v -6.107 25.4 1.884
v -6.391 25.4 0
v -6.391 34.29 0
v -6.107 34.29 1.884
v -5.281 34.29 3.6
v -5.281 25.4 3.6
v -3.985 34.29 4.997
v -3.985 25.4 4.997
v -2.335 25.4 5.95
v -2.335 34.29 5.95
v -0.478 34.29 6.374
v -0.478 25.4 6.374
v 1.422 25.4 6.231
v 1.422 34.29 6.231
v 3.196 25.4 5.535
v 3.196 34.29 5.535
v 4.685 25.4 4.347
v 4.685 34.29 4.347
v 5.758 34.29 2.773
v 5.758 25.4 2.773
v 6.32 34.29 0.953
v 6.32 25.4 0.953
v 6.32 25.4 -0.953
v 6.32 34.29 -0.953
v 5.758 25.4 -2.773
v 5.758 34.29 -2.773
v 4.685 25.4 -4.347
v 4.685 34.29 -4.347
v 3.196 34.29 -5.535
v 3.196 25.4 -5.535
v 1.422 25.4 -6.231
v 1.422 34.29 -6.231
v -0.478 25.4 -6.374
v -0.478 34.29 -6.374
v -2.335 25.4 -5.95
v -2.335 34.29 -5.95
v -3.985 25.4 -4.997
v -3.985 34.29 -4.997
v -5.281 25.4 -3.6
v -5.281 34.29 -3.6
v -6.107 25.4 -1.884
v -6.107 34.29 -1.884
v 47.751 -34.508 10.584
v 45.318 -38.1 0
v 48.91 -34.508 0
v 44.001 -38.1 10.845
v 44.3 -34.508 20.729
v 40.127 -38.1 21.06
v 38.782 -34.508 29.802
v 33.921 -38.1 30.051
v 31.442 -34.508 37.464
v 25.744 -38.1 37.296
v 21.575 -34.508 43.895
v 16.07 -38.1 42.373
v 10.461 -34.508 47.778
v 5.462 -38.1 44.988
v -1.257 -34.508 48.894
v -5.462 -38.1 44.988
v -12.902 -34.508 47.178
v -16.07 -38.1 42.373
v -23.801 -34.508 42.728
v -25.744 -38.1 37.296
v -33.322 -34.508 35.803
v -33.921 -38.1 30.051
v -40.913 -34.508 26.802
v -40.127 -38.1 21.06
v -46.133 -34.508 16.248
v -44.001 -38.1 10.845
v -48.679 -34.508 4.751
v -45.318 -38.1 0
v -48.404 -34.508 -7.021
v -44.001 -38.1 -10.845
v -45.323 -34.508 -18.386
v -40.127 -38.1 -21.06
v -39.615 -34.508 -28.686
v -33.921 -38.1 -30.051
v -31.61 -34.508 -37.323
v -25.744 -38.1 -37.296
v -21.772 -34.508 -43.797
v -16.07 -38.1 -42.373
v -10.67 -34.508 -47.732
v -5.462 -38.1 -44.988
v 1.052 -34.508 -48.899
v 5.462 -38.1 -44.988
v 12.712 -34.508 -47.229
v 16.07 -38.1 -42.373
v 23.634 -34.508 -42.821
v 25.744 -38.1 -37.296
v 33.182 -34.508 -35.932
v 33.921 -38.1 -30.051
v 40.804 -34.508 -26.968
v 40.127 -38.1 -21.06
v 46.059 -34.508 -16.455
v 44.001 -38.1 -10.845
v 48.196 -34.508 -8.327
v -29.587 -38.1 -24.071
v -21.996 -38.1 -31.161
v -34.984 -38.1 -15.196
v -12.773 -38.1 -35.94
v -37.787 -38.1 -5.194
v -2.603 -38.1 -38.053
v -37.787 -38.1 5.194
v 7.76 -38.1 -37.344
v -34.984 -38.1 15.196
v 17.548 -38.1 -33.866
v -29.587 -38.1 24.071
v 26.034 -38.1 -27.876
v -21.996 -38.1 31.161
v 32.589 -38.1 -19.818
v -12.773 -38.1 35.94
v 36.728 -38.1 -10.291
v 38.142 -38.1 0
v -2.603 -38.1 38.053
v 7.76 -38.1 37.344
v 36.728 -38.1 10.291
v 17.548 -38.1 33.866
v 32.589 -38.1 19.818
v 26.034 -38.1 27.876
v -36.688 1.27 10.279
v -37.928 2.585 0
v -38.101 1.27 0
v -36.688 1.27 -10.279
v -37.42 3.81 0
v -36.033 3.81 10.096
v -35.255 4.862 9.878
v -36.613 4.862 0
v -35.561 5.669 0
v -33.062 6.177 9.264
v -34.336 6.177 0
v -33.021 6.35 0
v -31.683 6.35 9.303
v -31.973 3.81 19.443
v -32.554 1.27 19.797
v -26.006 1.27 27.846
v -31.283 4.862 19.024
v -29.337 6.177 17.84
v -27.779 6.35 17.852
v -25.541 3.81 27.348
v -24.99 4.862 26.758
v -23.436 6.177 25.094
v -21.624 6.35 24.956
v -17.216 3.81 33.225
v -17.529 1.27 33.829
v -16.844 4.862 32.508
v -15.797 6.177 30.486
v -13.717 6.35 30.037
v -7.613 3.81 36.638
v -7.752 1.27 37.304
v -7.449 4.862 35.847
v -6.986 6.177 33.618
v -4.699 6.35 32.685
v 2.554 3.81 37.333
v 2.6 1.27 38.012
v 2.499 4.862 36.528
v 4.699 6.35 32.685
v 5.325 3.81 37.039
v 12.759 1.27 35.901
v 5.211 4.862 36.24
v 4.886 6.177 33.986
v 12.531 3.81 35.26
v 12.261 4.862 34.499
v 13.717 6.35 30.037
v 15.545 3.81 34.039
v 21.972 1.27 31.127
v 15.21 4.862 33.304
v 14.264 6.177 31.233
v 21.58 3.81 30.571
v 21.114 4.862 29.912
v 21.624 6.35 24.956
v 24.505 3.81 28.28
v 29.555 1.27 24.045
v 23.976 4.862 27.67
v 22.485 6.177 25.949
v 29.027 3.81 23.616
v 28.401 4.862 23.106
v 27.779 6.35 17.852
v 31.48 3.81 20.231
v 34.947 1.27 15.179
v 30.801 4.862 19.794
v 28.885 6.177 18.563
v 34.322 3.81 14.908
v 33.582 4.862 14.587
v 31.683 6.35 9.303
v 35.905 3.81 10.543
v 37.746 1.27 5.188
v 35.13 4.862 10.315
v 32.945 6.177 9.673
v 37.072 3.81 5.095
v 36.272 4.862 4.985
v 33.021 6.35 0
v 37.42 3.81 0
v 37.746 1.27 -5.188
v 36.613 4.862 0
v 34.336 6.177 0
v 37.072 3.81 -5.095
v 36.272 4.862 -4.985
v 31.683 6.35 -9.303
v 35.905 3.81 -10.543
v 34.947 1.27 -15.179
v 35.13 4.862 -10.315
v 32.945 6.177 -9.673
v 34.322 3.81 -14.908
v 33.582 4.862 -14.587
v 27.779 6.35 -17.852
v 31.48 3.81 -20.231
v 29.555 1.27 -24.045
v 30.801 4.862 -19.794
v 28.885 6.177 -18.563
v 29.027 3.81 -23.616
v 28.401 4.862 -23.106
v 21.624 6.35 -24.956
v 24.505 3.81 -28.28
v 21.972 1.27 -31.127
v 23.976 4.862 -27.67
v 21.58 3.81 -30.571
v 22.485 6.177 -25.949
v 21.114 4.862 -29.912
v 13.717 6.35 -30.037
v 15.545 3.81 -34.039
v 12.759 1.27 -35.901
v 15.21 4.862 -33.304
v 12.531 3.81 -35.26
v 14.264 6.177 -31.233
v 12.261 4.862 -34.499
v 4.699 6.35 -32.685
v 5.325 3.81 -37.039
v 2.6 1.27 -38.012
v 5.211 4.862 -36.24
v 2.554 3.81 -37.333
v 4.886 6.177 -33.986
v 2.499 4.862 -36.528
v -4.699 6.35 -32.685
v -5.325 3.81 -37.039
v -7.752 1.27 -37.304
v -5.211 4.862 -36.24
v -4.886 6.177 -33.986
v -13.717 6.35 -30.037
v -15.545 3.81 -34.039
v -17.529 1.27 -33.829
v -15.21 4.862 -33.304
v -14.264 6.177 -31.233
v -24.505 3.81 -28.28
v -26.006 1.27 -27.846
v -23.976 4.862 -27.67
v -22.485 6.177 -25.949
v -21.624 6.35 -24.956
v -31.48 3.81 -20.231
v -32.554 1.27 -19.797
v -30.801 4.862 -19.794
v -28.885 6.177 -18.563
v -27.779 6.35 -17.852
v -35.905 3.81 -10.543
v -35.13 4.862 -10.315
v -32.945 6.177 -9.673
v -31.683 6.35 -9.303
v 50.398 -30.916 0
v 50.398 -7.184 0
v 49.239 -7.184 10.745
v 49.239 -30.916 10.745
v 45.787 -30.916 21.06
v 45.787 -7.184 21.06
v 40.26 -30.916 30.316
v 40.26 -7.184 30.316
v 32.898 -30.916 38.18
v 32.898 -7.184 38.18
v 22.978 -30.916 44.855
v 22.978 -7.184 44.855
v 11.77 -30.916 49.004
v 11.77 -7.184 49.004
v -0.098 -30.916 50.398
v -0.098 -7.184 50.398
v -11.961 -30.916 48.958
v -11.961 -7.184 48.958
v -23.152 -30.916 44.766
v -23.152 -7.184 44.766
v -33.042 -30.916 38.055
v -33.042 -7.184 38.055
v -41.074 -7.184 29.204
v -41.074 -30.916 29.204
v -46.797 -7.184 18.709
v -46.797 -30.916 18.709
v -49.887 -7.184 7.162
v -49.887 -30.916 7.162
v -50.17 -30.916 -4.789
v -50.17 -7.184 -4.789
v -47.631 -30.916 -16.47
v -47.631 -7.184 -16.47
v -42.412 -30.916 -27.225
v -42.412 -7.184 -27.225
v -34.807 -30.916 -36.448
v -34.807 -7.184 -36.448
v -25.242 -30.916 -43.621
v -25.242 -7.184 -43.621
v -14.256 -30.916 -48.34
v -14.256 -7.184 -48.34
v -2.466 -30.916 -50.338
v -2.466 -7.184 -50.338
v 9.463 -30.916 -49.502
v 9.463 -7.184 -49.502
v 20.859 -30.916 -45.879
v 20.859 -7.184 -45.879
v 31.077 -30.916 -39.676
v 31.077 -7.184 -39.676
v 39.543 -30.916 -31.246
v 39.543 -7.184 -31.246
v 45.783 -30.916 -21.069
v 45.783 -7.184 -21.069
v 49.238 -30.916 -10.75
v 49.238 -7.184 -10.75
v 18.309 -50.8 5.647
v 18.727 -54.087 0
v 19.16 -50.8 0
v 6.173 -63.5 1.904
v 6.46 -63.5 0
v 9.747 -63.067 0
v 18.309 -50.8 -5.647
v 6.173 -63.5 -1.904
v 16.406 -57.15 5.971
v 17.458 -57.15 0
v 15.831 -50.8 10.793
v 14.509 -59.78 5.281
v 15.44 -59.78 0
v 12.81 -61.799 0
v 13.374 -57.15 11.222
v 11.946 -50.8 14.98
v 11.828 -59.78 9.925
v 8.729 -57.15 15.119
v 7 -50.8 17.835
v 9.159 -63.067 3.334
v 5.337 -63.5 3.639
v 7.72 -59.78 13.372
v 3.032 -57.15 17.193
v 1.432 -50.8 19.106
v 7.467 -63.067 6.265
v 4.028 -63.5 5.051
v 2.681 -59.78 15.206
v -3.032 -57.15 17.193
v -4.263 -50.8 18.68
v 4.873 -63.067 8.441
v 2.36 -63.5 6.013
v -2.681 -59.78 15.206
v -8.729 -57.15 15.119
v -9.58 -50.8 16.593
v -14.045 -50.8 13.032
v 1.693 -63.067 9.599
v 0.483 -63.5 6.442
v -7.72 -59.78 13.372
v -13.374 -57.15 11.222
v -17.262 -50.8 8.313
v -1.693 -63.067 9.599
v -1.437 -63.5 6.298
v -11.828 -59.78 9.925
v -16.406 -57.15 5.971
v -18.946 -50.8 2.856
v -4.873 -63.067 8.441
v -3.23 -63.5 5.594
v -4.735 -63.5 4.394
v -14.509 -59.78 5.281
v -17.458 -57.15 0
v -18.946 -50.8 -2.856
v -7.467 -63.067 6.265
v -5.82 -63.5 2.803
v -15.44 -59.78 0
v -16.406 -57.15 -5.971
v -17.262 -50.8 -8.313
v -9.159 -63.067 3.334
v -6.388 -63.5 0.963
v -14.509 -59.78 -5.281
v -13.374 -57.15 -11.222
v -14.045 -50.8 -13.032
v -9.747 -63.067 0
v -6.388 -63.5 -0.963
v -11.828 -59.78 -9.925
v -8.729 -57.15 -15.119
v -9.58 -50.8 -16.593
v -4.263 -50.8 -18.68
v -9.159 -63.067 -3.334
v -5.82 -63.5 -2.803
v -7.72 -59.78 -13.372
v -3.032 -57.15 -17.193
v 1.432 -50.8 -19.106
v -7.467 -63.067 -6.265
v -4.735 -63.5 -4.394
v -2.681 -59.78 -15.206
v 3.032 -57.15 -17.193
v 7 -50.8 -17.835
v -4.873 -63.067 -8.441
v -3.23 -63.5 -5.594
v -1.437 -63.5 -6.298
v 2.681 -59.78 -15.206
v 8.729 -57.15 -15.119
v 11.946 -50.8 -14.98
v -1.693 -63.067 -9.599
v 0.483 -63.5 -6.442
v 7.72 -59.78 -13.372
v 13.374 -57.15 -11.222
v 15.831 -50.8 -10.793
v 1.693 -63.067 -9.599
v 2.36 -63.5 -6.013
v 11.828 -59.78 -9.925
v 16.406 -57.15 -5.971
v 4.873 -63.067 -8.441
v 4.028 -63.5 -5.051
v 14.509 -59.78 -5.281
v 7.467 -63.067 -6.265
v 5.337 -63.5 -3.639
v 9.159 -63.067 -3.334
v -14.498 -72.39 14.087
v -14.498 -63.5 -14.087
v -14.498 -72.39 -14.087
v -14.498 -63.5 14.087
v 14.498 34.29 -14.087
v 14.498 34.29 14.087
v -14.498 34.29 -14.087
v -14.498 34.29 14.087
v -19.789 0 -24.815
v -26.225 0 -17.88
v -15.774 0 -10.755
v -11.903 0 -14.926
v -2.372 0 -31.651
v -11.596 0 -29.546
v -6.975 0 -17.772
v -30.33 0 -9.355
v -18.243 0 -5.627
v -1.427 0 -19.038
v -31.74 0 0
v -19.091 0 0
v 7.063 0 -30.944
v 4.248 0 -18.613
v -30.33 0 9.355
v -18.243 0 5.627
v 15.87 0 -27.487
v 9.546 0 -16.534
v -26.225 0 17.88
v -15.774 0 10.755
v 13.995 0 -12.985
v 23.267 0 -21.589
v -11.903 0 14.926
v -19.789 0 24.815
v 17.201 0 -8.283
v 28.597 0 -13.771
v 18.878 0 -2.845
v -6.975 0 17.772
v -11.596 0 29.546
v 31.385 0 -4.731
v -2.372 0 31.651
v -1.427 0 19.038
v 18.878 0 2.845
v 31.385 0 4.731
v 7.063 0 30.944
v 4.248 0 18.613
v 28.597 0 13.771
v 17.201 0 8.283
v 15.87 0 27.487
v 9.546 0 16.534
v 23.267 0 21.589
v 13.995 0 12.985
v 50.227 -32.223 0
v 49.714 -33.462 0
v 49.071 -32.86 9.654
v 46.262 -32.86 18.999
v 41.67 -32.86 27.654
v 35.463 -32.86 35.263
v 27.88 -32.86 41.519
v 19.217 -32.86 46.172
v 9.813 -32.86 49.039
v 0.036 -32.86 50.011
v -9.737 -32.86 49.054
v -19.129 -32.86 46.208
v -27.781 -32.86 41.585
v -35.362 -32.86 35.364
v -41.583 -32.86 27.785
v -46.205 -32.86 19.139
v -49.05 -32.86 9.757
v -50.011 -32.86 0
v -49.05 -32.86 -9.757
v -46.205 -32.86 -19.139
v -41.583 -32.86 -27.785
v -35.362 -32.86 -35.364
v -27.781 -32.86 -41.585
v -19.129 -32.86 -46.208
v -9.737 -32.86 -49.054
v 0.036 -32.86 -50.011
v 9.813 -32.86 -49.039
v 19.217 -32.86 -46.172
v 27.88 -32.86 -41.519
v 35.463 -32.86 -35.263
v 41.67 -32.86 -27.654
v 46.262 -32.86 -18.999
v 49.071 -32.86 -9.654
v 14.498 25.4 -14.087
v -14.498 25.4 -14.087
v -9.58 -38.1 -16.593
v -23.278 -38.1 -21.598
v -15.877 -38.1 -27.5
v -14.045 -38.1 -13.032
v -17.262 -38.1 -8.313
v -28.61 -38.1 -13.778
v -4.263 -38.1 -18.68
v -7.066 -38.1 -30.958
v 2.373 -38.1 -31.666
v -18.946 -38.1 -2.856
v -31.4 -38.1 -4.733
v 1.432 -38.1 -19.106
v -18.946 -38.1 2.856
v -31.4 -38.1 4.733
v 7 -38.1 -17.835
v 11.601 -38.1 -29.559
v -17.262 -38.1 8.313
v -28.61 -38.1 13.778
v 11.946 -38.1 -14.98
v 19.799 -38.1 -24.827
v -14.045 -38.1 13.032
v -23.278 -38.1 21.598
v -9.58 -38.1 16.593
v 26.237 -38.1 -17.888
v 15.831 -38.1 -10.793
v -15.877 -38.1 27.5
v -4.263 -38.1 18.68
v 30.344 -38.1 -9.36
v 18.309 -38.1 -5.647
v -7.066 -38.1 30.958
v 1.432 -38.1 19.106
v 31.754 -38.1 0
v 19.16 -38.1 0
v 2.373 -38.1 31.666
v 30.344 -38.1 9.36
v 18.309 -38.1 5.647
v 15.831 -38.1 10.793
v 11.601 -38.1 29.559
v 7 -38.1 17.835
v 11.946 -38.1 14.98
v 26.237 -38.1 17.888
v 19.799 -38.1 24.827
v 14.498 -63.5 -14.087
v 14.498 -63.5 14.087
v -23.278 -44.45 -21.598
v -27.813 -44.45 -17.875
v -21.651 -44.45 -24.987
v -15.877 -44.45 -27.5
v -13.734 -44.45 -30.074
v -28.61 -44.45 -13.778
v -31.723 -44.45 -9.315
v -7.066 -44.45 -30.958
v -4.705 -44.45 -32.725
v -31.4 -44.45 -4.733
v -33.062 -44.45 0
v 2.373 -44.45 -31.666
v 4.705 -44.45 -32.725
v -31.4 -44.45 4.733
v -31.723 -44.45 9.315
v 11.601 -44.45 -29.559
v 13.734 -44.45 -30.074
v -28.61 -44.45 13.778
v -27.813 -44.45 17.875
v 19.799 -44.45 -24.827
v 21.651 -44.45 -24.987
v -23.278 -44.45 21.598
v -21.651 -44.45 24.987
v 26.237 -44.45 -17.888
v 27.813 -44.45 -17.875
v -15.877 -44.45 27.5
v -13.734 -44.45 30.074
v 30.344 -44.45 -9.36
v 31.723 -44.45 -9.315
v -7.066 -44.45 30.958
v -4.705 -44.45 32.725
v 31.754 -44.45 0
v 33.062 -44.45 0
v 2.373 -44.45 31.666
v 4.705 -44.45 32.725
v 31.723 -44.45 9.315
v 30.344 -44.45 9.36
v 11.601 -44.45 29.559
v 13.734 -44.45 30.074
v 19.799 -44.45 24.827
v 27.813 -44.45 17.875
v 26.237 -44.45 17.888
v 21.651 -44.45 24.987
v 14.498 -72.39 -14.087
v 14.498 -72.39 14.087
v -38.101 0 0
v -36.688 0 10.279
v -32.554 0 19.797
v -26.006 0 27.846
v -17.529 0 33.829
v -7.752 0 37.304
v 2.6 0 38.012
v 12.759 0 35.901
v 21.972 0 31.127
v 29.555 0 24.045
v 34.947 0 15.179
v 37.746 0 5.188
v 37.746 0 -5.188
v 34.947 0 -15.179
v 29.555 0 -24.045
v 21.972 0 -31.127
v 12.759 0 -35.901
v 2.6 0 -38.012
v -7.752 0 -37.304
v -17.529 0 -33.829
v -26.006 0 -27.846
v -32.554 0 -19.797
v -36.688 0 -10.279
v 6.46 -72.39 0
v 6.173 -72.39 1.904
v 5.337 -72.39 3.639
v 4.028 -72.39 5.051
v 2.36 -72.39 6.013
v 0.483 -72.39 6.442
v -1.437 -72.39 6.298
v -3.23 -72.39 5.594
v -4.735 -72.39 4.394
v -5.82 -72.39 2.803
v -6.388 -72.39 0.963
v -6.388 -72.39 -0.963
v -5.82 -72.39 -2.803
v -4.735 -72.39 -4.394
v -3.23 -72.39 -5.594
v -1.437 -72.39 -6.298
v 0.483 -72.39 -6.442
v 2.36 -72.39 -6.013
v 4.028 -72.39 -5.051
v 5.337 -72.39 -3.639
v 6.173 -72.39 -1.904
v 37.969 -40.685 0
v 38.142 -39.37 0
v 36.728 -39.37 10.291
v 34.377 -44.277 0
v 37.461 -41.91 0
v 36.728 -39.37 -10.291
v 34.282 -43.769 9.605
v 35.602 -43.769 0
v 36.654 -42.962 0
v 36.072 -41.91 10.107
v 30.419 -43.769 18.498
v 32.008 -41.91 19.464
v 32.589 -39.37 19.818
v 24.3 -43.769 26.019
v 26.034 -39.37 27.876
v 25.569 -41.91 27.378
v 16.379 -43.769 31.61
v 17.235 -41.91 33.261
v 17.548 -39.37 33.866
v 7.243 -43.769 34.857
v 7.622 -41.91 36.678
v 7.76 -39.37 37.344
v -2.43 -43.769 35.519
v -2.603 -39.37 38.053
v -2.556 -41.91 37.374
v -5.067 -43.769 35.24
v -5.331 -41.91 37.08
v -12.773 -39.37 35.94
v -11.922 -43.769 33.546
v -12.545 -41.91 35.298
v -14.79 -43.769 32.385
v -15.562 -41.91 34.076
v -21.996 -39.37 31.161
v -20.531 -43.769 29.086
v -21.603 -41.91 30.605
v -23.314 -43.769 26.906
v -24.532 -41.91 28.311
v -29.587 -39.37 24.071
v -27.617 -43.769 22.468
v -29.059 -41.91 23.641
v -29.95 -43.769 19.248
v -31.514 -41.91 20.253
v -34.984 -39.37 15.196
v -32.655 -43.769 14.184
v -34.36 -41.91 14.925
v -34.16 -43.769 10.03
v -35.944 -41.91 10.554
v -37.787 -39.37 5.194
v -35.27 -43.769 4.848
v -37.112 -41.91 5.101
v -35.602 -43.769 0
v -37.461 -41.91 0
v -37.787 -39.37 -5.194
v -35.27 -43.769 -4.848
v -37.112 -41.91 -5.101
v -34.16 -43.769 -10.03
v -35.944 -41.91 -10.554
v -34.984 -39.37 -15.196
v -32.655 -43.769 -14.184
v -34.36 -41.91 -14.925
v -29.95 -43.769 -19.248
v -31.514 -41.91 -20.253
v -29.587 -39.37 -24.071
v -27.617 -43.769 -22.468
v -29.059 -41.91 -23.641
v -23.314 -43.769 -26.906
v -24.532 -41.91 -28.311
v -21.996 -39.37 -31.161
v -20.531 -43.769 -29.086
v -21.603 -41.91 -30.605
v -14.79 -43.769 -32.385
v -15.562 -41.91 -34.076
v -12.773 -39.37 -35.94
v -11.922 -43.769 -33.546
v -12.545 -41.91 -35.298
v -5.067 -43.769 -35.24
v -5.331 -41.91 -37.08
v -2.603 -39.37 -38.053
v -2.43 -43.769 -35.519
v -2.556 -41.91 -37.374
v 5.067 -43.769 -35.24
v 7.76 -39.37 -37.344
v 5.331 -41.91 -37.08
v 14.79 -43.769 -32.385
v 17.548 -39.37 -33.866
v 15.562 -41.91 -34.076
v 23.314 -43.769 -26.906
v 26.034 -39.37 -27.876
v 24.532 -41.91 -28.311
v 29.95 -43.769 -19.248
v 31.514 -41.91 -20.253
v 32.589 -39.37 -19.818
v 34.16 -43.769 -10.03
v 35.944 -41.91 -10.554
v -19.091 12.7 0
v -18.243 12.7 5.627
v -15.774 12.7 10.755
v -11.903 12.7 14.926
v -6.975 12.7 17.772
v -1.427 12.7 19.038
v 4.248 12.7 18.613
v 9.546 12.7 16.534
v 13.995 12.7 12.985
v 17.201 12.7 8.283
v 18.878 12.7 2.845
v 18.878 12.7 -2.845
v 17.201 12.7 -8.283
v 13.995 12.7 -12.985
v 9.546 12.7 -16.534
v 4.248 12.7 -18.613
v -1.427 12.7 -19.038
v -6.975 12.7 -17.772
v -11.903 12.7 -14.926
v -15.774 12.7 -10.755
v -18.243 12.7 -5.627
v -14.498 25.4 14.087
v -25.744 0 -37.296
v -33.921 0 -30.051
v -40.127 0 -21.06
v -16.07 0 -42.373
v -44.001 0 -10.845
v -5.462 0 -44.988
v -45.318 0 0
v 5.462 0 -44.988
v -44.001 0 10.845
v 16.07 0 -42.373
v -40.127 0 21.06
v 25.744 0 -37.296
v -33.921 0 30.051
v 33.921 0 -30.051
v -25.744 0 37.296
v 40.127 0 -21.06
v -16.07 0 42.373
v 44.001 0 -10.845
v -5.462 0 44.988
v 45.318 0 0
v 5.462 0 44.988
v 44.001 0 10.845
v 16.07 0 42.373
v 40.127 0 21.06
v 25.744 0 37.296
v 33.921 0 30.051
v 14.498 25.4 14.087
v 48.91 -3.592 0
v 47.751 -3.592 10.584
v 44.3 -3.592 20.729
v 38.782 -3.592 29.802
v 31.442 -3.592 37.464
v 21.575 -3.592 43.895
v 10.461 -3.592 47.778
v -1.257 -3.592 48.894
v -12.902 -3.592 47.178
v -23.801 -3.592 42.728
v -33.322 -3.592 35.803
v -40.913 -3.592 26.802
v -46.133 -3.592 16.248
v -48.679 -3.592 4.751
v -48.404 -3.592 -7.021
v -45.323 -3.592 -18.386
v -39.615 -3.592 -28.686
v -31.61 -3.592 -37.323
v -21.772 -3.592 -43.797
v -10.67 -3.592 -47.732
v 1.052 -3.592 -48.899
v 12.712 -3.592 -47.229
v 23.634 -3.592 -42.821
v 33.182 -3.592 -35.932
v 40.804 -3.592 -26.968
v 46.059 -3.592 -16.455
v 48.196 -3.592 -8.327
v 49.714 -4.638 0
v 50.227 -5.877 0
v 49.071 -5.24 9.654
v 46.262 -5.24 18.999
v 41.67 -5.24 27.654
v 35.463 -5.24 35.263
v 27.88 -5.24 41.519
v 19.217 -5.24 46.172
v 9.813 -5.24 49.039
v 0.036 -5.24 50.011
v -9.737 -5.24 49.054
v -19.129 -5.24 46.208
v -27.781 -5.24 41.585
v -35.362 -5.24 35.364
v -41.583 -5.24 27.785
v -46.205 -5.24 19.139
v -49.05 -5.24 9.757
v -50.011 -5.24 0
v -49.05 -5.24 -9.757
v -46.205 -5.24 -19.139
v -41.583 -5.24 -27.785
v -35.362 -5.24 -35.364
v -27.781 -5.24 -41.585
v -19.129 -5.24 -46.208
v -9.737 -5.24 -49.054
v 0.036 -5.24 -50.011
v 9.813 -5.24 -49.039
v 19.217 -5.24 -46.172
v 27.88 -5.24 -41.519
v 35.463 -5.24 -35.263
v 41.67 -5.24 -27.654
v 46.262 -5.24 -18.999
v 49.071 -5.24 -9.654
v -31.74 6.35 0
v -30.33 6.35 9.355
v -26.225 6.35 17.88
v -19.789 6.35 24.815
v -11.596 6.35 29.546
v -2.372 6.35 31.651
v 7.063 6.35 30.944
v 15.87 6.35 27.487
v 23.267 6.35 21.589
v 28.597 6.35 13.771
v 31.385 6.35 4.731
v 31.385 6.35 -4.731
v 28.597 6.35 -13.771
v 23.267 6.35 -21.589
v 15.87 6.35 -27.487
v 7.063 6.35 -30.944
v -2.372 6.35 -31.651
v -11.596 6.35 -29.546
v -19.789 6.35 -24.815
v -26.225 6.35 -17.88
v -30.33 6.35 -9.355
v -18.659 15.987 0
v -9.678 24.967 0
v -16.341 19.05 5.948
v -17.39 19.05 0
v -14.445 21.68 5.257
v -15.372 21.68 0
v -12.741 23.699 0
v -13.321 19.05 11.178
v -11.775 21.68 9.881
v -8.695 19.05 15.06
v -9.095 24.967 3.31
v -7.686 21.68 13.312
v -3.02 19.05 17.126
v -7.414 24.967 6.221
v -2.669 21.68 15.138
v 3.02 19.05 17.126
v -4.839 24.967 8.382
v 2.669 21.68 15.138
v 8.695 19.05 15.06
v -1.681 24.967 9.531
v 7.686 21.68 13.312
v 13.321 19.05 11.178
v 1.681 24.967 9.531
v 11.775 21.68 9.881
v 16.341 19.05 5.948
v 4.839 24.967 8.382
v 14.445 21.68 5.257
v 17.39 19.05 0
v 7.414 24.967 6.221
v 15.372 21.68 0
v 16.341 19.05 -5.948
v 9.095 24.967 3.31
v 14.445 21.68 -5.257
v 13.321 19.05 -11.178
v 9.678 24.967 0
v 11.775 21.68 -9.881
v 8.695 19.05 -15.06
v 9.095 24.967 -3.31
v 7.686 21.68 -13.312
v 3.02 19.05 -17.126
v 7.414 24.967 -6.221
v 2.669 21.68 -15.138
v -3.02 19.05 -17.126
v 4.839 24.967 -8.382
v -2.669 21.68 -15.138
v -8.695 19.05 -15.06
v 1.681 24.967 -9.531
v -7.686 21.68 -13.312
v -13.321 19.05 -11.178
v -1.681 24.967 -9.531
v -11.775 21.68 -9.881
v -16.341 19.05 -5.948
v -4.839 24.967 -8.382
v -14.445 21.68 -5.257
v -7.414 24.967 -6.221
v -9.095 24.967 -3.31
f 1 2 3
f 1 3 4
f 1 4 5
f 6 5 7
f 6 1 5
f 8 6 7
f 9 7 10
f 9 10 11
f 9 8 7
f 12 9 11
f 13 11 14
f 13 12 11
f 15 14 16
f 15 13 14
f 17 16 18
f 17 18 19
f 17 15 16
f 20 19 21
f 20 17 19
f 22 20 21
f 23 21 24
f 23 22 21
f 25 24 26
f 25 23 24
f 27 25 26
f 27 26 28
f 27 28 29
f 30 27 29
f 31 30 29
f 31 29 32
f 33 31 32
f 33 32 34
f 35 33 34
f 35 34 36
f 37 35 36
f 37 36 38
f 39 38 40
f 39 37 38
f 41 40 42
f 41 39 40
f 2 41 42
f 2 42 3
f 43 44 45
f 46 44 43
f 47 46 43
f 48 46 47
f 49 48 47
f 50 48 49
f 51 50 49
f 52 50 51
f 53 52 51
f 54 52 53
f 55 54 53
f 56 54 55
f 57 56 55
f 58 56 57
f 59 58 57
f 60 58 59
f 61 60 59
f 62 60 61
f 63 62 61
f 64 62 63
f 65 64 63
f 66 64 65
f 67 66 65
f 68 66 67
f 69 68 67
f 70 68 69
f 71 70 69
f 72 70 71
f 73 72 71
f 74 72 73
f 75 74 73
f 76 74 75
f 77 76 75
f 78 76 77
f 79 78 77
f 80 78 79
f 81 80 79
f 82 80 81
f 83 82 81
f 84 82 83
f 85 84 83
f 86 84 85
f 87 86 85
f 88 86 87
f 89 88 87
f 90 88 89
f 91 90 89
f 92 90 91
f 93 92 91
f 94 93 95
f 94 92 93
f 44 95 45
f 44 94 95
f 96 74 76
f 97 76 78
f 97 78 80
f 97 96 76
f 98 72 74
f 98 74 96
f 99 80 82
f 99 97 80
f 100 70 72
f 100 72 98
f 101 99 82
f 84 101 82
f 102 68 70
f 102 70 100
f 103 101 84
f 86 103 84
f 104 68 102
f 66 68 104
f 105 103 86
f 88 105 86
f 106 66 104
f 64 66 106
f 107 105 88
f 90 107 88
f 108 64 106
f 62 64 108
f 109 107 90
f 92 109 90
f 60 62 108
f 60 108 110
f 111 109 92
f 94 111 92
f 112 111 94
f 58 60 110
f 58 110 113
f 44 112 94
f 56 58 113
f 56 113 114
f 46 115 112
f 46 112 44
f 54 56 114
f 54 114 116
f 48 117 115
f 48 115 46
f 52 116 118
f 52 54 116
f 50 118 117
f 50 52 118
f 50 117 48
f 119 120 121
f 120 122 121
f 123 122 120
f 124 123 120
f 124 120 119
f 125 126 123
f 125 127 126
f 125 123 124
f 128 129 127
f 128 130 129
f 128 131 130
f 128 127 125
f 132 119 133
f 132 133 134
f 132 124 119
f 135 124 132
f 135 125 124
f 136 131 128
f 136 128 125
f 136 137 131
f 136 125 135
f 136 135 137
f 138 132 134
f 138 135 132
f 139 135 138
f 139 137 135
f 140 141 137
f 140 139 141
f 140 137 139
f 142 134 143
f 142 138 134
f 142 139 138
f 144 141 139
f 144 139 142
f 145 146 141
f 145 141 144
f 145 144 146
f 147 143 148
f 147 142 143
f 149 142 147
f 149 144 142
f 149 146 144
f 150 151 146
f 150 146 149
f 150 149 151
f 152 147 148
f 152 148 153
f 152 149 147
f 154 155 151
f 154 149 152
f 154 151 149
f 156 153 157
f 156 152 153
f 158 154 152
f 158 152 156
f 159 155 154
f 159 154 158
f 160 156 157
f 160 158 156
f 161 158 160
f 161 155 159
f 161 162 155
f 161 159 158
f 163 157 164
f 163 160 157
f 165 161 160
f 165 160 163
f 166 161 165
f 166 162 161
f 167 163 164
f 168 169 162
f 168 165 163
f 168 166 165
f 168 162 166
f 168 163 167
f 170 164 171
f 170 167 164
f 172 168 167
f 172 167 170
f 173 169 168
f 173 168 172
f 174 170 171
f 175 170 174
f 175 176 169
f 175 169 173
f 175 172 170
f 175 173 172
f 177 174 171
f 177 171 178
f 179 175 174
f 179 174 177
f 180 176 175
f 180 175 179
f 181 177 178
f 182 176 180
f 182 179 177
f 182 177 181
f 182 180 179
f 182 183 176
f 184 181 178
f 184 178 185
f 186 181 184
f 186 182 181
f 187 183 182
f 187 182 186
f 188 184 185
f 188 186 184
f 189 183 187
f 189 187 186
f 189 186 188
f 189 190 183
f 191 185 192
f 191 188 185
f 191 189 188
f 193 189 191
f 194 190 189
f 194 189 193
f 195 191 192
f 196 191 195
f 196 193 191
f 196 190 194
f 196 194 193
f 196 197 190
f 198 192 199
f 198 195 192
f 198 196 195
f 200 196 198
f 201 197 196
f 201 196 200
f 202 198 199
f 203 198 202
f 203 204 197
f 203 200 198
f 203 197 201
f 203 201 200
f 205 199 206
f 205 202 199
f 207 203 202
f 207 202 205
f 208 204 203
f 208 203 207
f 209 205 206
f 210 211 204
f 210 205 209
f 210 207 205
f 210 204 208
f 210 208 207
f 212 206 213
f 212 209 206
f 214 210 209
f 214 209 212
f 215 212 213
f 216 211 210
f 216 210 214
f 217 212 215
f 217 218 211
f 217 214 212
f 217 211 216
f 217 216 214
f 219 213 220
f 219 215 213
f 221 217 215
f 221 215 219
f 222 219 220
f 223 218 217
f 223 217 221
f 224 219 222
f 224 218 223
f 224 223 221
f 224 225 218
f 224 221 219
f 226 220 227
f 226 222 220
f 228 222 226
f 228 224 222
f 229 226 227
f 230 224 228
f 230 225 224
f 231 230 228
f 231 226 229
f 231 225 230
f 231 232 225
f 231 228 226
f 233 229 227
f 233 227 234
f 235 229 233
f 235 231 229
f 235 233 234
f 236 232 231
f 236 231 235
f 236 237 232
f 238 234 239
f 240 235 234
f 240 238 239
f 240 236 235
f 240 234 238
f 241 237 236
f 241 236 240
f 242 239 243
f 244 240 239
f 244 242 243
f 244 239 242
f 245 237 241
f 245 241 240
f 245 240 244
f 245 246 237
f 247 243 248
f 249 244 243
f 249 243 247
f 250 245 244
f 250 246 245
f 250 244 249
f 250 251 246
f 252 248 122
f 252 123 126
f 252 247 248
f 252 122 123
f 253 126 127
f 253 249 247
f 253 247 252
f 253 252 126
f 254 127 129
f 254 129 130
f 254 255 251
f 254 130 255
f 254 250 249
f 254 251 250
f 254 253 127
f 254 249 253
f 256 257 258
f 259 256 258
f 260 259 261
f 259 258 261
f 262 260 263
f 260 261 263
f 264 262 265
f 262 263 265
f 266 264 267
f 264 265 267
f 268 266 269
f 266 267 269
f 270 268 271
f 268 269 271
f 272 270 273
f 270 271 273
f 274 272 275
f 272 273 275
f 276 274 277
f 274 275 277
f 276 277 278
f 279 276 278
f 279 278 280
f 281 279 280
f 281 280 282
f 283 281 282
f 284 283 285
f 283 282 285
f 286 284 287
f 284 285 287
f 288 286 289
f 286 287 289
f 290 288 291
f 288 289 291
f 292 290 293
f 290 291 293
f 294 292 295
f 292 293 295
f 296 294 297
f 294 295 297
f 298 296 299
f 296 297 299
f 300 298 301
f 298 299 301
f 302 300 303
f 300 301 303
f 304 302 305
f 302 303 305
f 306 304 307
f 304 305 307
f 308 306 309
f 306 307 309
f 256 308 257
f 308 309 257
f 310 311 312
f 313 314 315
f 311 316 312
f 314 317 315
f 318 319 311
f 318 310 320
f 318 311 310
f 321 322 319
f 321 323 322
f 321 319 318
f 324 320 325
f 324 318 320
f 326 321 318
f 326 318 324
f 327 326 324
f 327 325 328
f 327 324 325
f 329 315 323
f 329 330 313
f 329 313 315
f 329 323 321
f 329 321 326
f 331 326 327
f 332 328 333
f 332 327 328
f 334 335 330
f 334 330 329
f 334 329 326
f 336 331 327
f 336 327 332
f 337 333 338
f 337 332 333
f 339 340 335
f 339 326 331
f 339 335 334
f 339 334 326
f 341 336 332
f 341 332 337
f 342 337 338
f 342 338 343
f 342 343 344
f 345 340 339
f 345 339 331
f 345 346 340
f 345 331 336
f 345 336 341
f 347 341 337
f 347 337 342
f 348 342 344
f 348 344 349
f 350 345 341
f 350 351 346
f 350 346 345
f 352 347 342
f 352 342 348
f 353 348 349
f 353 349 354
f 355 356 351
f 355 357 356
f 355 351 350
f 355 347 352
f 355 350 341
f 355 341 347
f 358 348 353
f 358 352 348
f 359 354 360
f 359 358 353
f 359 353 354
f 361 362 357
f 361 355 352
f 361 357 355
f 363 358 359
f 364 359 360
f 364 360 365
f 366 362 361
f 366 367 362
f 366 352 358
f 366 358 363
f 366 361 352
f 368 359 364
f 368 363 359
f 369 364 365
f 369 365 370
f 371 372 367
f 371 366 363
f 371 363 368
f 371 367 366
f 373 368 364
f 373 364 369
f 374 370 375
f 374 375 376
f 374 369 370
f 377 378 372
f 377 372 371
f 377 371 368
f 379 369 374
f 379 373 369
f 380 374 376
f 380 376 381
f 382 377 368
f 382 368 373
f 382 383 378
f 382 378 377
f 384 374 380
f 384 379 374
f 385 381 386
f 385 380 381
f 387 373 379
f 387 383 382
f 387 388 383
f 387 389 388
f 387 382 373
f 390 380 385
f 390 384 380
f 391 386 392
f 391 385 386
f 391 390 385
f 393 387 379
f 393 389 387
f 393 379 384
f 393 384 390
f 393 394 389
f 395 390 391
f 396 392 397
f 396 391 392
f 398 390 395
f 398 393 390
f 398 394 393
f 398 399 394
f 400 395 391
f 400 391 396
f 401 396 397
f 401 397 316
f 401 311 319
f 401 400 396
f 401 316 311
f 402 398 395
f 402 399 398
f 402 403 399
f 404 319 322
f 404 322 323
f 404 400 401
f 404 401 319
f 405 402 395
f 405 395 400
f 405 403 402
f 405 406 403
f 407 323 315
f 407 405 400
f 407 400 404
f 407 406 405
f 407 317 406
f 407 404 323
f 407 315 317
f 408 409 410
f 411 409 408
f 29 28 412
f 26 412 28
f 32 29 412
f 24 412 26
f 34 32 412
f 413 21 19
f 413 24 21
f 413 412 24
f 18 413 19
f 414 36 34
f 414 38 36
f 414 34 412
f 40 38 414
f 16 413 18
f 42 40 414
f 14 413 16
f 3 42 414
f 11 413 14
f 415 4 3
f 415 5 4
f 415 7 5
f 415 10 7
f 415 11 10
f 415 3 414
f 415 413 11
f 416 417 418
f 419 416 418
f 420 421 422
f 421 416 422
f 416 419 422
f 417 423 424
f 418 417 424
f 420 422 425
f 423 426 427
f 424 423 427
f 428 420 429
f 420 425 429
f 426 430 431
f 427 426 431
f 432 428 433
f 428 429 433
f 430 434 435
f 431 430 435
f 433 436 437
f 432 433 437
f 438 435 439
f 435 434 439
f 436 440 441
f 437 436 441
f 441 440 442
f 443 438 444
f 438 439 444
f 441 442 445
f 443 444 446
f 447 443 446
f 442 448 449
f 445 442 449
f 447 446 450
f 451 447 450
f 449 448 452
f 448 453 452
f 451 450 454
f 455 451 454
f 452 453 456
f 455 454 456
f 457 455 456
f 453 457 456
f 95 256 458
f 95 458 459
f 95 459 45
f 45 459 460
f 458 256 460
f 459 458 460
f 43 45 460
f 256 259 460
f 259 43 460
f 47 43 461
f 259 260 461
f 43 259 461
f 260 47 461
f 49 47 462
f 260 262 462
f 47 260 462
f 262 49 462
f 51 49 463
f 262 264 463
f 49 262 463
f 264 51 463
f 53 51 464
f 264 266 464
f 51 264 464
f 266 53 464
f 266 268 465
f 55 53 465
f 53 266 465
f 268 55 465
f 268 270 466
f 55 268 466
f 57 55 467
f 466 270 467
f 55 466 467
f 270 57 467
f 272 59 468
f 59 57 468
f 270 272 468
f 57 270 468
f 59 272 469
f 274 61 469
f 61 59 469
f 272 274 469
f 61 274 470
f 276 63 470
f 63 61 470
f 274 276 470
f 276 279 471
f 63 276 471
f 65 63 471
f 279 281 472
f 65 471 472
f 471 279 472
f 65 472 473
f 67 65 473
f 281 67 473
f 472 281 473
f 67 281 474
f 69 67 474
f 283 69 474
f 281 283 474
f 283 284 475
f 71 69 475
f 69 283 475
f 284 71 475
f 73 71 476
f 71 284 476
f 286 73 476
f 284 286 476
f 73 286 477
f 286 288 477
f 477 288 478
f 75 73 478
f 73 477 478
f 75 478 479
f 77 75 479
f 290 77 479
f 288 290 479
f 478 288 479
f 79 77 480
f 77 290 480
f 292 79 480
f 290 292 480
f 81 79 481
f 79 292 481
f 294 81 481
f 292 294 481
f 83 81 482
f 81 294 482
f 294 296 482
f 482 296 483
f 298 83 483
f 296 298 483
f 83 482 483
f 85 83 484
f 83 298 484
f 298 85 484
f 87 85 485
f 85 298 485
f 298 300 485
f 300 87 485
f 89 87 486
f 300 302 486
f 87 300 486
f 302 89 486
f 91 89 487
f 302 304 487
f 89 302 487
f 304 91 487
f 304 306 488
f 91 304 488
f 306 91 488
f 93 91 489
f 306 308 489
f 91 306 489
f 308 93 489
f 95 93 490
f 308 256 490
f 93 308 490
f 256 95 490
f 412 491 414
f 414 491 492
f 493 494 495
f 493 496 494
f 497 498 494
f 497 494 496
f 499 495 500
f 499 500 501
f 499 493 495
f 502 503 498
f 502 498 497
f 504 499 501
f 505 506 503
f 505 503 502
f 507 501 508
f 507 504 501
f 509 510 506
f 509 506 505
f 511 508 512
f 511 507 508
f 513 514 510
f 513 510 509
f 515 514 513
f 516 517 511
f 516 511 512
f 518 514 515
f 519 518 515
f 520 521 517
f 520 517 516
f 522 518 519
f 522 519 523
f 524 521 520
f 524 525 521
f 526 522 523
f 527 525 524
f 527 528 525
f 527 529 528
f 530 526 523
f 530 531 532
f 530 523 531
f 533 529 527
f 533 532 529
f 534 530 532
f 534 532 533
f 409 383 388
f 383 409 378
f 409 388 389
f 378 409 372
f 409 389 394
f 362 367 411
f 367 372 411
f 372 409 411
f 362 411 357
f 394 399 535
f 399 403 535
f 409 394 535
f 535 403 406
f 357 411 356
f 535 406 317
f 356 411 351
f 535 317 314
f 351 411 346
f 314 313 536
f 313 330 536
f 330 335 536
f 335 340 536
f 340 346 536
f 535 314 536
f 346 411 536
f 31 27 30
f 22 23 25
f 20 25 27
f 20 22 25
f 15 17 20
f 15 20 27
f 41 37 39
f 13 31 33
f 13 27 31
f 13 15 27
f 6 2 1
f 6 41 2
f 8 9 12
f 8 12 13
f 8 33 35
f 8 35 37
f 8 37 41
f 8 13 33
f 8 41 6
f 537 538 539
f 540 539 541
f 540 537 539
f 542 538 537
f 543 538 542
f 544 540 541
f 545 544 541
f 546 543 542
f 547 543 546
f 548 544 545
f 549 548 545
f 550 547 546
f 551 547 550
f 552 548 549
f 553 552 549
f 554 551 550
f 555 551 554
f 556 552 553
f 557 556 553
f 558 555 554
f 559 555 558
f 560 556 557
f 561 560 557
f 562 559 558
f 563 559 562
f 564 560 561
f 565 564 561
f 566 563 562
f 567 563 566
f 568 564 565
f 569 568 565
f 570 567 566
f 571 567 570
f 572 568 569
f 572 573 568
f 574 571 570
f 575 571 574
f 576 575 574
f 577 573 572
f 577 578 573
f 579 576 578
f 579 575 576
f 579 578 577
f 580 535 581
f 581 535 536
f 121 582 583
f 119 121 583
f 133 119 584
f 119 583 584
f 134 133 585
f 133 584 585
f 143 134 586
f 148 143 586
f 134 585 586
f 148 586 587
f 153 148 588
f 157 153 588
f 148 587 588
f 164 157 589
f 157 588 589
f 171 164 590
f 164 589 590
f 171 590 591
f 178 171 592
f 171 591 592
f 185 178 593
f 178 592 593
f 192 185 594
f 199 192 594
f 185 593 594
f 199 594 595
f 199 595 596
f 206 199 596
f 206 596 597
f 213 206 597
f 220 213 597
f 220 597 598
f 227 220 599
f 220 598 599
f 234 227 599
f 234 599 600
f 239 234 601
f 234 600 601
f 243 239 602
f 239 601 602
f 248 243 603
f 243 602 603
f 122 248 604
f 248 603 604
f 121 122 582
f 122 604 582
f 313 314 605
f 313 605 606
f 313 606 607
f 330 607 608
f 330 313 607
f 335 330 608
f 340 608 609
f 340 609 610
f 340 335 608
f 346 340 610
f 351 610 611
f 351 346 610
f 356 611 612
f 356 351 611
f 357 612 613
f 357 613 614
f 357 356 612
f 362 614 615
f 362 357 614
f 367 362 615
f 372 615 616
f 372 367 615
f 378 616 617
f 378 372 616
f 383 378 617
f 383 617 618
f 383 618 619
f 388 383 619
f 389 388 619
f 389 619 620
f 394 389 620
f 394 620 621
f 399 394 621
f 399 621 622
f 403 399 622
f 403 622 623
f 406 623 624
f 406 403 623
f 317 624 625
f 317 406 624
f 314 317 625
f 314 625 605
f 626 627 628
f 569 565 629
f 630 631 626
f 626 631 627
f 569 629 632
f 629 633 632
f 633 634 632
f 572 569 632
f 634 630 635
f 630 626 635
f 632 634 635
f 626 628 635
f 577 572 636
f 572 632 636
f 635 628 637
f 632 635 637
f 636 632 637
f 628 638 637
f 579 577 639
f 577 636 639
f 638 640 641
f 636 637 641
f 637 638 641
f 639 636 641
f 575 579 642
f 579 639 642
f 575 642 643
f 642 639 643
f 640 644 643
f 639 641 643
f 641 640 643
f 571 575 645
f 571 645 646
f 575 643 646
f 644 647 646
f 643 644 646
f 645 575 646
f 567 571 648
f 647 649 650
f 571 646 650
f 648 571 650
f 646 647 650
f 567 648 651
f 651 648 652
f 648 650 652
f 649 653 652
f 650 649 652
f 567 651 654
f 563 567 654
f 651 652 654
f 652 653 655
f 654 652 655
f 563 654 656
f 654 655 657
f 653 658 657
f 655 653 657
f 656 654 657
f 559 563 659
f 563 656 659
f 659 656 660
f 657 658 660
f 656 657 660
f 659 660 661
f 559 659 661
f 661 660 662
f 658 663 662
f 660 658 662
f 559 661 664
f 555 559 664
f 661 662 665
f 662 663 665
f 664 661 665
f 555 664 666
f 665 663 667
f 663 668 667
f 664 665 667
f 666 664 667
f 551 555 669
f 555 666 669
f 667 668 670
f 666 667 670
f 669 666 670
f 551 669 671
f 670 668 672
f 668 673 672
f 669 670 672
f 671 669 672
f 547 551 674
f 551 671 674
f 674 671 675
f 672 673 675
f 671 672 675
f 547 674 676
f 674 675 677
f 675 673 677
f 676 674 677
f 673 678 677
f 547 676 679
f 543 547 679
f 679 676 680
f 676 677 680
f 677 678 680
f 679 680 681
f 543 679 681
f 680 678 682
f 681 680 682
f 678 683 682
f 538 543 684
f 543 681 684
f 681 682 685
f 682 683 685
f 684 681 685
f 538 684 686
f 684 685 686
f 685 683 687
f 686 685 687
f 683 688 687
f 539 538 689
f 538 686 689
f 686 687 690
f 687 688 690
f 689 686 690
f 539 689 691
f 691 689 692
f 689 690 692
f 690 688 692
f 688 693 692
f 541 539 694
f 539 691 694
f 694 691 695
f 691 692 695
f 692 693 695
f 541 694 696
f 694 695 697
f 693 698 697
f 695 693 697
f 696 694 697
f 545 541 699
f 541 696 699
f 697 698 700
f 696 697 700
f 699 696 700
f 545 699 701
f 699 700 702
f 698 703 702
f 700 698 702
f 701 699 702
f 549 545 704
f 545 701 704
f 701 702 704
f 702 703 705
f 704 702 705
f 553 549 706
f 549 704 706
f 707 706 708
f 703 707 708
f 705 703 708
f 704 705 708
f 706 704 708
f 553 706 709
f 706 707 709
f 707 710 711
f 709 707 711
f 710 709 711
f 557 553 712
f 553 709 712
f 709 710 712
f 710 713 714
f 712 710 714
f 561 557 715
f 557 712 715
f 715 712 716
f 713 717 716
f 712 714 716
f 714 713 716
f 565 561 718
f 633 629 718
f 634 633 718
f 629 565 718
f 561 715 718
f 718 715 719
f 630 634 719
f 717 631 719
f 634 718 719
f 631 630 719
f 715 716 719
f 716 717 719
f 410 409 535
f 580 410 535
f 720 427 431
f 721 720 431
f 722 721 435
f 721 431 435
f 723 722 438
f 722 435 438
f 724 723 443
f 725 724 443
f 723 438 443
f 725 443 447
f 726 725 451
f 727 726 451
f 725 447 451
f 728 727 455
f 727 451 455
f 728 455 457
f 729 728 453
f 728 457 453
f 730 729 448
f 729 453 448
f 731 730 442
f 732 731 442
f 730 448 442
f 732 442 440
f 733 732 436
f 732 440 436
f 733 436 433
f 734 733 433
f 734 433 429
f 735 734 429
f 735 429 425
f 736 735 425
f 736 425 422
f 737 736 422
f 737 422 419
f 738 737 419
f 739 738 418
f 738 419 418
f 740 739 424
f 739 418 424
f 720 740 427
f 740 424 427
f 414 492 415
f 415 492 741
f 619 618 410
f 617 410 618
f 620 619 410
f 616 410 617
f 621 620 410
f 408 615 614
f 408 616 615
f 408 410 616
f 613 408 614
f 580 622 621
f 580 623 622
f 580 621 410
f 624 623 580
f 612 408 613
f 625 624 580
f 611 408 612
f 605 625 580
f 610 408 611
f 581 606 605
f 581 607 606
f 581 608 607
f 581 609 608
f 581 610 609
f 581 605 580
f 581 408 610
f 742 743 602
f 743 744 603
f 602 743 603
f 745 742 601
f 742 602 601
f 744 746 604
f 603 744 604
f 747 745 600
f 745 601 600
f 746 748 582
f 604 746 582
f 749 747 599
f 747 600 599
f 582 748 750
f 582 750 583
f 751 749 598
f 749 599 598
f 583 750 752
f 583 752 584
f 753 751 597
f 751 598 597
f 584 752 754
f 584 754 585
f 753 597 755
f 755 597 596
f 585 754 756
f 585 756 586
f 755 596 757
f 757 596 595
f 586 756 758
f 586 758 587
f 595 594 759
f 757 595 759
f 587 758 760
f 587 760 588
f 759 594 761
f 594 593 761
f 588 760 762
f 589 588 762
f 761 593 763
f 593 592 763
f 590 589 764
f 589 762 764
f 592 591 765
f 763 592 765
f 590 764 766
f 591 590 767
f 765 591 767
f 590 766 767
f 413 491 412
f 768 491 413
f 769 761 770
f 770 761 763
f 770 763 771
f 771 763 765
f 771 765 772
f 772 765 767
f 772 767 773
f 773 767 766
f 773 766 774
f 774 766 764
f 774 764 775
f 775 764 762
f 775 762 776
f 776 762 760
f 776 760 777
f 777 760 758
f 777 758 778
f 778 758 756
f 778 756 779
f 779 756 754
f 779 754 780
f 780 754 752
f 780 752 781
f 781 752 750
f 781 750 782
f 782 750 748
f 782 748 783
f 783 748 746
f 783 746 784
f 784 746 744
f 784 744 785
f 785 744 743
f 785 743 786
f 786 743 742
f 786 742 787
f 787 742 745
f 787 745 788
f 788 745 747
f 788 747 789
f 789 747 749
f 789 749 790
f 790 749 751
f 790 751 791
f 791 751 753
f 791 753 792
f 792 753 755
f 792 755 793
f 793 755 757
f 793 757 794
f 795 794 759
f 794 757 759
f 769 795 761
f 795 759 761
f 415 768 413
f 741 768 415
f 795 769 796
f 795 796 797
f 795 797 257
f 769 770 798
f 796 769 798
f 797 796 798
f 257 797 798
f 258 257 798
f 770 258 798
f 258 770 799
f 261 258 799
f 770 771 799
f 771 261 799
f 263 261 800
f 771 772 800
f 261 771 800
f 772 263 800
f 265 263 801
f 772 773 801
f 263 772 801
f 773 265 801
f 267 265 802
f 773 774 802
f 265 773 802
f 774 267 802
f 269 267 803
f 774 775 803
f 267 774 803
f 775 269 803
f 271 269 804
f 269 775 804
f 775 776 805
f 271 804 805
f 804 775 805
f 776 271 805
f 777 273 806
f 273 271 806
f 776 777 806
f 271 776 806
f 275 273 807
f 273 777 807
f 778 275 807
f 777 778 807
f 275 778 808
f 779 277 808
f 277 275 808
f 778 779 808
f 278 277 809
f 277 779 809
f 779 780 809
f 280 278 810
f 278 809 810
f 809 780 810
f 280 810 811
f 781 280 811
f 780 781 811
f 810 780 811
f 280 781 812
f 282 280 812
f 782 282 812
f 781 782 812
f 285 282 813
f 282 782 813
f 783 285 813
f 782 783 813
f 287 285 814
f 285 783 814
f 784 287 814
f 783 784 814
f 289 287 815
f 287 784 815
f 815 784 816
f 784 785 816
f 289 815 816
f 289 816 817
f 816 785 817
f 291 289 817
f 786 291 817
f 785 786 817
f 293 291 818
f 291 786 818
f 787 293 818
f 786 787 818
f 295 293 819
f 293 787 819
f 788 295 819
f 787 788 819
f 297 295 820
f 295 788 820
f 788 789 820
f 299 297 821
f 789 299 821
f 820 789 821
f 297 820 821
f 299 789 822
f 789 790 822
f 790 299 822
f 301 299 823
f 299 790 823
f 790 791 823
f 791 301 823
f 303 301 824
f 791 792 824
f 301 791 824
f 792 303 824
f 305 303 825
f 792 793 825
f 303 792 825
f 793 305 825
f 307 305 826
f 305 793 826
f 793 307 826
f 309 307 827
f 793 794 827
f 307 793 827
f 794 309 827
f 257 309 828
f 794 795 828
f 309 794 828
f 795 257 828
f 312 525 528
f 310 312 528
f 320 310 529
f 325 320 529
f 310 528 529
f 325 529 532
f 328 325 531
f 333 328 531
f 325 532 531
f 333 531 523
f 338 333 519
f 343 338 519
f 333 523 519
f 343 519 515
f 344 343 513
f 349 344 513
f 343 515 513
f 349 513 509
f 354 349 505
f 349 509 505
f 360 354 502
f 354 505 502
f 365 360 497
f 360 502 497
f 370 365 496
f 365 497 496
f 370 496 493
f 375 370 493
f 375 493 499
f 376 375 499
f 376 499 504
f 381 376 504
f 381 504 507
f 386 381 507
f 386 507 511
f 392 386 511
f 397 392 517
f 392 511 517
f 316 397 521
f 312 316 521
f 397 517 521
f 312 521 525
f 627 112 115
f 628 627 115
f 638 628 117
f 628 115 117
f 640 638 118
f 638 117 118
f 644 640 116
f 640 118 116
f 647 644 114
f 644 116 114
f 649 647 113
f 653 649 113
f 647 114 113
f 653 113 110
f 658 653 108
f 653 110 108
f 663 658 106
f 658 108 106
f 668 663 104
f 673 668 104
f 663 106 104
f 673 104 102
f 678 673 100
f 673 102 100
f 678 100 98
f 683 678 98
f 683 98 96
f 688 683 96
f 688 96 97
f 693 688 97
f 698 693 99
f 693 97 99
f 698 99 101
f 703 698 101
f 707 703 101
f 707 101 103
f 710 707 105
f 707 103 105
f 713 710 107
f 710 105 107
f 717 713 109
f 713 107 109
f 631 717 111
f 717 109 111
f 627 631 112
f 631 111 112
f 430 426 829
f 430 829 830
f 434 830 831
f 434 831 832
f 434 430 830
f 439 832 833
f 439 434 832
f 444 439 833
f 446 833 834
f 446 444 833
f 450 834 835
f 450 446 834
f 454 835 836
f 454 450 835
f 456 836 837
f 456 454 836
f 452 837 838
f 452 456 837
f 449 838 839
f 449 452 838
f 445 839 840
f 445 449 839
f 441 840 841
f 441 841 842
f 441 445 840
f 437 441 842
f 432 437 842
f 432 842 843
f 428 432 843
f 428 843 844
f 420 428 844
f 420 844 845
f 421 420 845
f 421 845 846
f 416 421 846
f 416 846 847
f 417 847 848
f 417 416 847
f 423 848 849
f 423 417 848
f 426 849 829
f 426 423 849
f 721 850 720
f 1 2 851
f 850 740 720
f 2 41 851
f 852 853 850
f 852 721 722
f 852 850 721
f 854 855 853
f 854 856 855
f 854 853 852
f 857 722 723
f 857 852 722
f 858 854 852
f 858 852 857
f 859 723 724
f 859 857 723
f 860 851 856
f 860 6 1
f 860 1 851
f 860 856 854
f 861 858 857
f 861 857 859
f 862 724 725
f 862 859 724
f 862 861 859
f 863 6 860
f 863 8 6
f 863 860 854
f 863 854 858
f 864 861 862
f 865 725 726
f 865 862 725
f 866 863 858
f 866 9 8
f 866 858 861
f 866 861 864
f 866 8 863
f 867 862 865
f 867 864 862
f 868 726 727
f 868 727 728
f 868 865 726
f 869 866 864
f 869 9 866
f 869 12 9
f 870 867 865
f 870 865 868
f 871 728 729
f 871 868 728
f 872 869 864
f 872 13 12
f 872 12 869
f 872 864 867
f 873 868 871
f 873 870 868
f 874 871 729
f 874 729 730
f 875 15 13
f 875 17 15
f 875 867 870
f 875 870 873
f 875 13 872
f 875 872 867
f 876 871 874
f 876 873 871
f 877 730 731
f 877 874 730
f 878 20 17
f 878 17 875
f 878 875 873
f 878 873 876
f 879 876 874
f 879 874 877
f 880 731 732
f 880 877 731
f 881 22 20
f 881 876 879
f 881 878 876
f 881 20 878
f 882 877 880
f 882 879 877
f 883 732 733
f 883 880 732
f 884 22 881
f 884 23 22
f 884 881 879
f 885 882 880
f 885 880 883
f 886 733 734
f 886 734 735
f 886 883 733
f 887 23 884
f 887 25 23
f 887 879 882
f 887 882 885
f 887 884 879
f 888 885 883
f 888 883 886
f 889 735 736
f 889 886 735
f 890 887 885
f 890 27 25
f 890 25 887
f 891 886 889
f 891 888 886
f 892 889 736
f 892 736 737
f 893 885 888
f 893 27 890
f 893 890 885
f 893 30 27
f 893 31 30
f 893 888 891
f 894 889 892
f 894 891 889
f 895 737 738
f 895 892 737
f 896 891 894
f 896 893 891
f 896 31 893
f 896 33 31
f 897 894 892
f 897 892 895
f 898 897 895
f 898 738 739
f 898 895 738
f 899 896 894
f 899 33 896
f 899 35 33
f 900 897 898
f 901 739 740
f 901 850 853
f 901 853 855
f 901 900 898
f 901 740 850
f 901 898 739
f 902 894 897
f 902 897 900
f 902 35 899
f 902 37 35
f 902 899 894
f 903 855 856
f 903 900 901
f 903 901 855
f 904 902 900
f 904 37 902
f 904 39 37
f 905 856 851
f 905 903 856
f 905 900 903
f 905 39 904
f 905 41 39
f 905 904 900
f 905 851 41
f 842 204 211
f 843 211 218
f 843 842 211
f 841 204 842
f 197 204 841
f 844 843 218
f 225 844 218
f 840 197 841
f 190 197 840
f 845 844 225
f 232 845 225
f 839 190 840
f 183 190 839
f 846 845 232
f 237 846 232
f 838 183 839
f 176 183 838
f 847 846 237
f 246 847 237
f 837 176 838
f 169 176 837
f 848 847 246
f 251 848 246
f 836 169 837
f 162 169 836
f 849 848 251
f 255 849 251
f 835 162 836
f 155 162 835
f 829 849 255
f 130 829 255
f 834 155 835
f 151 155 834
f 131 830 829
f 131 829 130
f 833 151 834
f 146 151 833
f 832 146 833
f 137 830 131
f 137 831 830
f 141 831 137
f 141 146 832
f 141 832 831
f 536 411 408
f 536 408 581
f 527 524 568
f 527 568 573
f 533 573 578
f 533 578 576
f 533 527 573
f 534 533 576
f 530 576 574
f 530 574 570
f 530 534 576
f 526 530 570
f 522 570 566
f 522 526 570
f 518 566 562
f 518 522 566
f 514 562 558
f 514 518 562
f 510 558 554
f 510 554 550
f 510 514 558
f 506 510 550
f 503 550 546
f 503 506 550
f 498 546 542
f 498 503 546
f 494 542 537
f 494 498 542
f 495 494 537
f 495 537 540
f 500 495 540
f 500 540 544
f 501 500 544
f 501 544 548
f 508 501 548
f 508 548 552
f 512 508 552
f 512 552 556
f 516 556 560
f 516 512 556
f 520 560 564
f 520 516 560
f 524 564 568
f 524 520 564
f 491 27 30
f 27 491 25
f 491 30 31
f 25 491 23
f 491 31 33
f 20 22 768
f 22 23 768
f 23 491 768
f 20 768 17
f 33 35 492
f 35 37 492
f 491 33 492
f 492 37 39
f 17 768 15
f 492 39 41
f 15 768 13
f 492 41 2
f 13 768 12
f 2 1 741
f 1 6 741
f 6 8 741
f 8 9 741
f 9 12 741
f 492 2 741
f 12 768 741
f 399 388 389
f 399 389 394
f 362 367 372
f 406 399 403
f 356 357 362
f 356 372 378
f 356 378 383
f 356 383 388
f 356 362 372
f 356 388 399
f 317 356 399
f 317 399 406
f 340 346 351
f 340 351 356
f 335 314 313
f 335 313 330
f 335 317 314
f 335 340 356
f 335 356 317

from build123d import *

# Parameters (mm, degrees)
F0_R      = 50.398116
F1_DEPTH  = 38.1
F2_SIZE   = 5.08
F3_SIZE   = 5.08
F4_R      = 19.1599
F5_DEPTH  = 25.4
F6_R      = 19.091437
F7_DEPTH  = 25.4
F8_R      = 12.7
F9_R      = 12.7
F10_W     = 28.995078
F10_H     = 28.174462
F10_R     = 6.4599
F11_DEPTH = 8.89
F12_W     = 28.995078
F12_H     = 28.174462
F12_R     = 6.391437
F13_DEPTH = 8.89
F14_R     = 38.141945
F14_R_2   = 31.754329
F15_DEPTH = 6.35
F16_R     = 38.100899
F16_R_2   = 31.739767
F17_DEPTH = 6.35
F18_R     = 5.08
F19_R     = 5.08
F20_R     = 5.08


with BuildPart() as f1:
    # F0 (on Front) → F1 (new body)
    with BuildSketch(Plane.XZ):
        Circle(F0_R)
    extrude(amount=F1_DEPTH)

    # F2
    f2_edges = [f1.edges().sort_by_distance(p)[0] for p in [
        (-50.398116, -38.1, 0),
    ]]
    chamfer(f2_edges, length=F2_SIZE)

    # F3
    f3_edges = [f1.edges().sort_by_distance(p)[0] for p in [
        (-50.398116, 0, 0),
    ]]
    chamfer(f3_edges, length=F3_SIZE)

    # F4 (on face) → F5 (join)
    with BuildSketch(Plane.XZ.offset(38.1)):
        Circle(F4_R)
    extrude(amount=F5_DEPTH)

    # F6 (on face) → F7 (join)
    with BuildSketch(Plane(origin=(0, 0, 0), x_dir=(-1, 0, 0), z_dir=(0, 1, 0))):
        Circle(F6_R)
    extrude(amount=F7_DEPTH)

    # F8
    f8_edges = [f1.edges().sort_by_distance(p)[0] for p in [
        (19.091437, 25.4, 0),
    ]]
    fillet(f8_edges, radius=F8_R)

    # F9
    f9_edges = [f1.edges().sort_by_distance(p)[0] for p in [
        (-19.1599, -63.5, 0),
    ]]
    fillet(f9_edges, radius=F9_R)

    # F14 (on face) → F15 (join)
    with BuildSketch(Plane.XZ.offset(38.1)):
        Circle(F14_R)
        Circle(F14_R_2, mode=Mode.SUBTRACT)
    extrude(amount=F15_DEPTH)

    # F16 (on face) → F17 (join)
    with BuildSketch(Plane(origin=(0, 0, 0), x_dir=(-1, 0, 0), z_dir=(0, 1, 0))):
        Circle(F16_R)
        Circle(F16_R_2, mode=Mode.SUBTRACT)
    extrude(amount=F17_DEPTH)

    # F18
    f18_edges = [f1.edges().sort_by_distance(p)[0] for p in [
        (-38.141945, -44.45, 0),
    ]]
    fillet(f18_edges, radius=F18_R)

    # F19
    f19_edges = [f1.edges().sort_by_distance(p)[0] for p in [
        (38.100899, 6.35, 0),
    ]]
    fillet(f19_edges, radius=F19_R)

    # F20
    f20_edges = [f1.edges().sort_by_distance(p)[0] for p in [
        (50.398116, -19.05, 0),
        (-50.398116, -5.08, 0),
        (-50.398116, -33.02, 0),
    ]]
    fillet(f20_edges, radius=F20_R)


with BuildPart() as f11:
    # F10 (on face) → F11 (new body)
    with BuildSketch(Plane.XZ.offset(63.5)):
        Rectangle(F10_W, F10_H)
        Circle(F10_R, mode=Mode.SUBTRACT)
    extrude(amount=F11_DEPTH)


with BuildPart() as f13:
    # F12 (on face) → F13 (new body)
    with BuildSketch(Plane(origin=(0, 25.4, 0), x_dir=(-1, 0, 0), z_dir=(0, 1, 0))):
        Rectangle(F12_W, F12_H)
        Circle(F12_R, mode=Mode.SUBTRACT)
    extrude(amount=F13_DEPTH)


solid = Compound([f1.part, f11.part, f13.part])
